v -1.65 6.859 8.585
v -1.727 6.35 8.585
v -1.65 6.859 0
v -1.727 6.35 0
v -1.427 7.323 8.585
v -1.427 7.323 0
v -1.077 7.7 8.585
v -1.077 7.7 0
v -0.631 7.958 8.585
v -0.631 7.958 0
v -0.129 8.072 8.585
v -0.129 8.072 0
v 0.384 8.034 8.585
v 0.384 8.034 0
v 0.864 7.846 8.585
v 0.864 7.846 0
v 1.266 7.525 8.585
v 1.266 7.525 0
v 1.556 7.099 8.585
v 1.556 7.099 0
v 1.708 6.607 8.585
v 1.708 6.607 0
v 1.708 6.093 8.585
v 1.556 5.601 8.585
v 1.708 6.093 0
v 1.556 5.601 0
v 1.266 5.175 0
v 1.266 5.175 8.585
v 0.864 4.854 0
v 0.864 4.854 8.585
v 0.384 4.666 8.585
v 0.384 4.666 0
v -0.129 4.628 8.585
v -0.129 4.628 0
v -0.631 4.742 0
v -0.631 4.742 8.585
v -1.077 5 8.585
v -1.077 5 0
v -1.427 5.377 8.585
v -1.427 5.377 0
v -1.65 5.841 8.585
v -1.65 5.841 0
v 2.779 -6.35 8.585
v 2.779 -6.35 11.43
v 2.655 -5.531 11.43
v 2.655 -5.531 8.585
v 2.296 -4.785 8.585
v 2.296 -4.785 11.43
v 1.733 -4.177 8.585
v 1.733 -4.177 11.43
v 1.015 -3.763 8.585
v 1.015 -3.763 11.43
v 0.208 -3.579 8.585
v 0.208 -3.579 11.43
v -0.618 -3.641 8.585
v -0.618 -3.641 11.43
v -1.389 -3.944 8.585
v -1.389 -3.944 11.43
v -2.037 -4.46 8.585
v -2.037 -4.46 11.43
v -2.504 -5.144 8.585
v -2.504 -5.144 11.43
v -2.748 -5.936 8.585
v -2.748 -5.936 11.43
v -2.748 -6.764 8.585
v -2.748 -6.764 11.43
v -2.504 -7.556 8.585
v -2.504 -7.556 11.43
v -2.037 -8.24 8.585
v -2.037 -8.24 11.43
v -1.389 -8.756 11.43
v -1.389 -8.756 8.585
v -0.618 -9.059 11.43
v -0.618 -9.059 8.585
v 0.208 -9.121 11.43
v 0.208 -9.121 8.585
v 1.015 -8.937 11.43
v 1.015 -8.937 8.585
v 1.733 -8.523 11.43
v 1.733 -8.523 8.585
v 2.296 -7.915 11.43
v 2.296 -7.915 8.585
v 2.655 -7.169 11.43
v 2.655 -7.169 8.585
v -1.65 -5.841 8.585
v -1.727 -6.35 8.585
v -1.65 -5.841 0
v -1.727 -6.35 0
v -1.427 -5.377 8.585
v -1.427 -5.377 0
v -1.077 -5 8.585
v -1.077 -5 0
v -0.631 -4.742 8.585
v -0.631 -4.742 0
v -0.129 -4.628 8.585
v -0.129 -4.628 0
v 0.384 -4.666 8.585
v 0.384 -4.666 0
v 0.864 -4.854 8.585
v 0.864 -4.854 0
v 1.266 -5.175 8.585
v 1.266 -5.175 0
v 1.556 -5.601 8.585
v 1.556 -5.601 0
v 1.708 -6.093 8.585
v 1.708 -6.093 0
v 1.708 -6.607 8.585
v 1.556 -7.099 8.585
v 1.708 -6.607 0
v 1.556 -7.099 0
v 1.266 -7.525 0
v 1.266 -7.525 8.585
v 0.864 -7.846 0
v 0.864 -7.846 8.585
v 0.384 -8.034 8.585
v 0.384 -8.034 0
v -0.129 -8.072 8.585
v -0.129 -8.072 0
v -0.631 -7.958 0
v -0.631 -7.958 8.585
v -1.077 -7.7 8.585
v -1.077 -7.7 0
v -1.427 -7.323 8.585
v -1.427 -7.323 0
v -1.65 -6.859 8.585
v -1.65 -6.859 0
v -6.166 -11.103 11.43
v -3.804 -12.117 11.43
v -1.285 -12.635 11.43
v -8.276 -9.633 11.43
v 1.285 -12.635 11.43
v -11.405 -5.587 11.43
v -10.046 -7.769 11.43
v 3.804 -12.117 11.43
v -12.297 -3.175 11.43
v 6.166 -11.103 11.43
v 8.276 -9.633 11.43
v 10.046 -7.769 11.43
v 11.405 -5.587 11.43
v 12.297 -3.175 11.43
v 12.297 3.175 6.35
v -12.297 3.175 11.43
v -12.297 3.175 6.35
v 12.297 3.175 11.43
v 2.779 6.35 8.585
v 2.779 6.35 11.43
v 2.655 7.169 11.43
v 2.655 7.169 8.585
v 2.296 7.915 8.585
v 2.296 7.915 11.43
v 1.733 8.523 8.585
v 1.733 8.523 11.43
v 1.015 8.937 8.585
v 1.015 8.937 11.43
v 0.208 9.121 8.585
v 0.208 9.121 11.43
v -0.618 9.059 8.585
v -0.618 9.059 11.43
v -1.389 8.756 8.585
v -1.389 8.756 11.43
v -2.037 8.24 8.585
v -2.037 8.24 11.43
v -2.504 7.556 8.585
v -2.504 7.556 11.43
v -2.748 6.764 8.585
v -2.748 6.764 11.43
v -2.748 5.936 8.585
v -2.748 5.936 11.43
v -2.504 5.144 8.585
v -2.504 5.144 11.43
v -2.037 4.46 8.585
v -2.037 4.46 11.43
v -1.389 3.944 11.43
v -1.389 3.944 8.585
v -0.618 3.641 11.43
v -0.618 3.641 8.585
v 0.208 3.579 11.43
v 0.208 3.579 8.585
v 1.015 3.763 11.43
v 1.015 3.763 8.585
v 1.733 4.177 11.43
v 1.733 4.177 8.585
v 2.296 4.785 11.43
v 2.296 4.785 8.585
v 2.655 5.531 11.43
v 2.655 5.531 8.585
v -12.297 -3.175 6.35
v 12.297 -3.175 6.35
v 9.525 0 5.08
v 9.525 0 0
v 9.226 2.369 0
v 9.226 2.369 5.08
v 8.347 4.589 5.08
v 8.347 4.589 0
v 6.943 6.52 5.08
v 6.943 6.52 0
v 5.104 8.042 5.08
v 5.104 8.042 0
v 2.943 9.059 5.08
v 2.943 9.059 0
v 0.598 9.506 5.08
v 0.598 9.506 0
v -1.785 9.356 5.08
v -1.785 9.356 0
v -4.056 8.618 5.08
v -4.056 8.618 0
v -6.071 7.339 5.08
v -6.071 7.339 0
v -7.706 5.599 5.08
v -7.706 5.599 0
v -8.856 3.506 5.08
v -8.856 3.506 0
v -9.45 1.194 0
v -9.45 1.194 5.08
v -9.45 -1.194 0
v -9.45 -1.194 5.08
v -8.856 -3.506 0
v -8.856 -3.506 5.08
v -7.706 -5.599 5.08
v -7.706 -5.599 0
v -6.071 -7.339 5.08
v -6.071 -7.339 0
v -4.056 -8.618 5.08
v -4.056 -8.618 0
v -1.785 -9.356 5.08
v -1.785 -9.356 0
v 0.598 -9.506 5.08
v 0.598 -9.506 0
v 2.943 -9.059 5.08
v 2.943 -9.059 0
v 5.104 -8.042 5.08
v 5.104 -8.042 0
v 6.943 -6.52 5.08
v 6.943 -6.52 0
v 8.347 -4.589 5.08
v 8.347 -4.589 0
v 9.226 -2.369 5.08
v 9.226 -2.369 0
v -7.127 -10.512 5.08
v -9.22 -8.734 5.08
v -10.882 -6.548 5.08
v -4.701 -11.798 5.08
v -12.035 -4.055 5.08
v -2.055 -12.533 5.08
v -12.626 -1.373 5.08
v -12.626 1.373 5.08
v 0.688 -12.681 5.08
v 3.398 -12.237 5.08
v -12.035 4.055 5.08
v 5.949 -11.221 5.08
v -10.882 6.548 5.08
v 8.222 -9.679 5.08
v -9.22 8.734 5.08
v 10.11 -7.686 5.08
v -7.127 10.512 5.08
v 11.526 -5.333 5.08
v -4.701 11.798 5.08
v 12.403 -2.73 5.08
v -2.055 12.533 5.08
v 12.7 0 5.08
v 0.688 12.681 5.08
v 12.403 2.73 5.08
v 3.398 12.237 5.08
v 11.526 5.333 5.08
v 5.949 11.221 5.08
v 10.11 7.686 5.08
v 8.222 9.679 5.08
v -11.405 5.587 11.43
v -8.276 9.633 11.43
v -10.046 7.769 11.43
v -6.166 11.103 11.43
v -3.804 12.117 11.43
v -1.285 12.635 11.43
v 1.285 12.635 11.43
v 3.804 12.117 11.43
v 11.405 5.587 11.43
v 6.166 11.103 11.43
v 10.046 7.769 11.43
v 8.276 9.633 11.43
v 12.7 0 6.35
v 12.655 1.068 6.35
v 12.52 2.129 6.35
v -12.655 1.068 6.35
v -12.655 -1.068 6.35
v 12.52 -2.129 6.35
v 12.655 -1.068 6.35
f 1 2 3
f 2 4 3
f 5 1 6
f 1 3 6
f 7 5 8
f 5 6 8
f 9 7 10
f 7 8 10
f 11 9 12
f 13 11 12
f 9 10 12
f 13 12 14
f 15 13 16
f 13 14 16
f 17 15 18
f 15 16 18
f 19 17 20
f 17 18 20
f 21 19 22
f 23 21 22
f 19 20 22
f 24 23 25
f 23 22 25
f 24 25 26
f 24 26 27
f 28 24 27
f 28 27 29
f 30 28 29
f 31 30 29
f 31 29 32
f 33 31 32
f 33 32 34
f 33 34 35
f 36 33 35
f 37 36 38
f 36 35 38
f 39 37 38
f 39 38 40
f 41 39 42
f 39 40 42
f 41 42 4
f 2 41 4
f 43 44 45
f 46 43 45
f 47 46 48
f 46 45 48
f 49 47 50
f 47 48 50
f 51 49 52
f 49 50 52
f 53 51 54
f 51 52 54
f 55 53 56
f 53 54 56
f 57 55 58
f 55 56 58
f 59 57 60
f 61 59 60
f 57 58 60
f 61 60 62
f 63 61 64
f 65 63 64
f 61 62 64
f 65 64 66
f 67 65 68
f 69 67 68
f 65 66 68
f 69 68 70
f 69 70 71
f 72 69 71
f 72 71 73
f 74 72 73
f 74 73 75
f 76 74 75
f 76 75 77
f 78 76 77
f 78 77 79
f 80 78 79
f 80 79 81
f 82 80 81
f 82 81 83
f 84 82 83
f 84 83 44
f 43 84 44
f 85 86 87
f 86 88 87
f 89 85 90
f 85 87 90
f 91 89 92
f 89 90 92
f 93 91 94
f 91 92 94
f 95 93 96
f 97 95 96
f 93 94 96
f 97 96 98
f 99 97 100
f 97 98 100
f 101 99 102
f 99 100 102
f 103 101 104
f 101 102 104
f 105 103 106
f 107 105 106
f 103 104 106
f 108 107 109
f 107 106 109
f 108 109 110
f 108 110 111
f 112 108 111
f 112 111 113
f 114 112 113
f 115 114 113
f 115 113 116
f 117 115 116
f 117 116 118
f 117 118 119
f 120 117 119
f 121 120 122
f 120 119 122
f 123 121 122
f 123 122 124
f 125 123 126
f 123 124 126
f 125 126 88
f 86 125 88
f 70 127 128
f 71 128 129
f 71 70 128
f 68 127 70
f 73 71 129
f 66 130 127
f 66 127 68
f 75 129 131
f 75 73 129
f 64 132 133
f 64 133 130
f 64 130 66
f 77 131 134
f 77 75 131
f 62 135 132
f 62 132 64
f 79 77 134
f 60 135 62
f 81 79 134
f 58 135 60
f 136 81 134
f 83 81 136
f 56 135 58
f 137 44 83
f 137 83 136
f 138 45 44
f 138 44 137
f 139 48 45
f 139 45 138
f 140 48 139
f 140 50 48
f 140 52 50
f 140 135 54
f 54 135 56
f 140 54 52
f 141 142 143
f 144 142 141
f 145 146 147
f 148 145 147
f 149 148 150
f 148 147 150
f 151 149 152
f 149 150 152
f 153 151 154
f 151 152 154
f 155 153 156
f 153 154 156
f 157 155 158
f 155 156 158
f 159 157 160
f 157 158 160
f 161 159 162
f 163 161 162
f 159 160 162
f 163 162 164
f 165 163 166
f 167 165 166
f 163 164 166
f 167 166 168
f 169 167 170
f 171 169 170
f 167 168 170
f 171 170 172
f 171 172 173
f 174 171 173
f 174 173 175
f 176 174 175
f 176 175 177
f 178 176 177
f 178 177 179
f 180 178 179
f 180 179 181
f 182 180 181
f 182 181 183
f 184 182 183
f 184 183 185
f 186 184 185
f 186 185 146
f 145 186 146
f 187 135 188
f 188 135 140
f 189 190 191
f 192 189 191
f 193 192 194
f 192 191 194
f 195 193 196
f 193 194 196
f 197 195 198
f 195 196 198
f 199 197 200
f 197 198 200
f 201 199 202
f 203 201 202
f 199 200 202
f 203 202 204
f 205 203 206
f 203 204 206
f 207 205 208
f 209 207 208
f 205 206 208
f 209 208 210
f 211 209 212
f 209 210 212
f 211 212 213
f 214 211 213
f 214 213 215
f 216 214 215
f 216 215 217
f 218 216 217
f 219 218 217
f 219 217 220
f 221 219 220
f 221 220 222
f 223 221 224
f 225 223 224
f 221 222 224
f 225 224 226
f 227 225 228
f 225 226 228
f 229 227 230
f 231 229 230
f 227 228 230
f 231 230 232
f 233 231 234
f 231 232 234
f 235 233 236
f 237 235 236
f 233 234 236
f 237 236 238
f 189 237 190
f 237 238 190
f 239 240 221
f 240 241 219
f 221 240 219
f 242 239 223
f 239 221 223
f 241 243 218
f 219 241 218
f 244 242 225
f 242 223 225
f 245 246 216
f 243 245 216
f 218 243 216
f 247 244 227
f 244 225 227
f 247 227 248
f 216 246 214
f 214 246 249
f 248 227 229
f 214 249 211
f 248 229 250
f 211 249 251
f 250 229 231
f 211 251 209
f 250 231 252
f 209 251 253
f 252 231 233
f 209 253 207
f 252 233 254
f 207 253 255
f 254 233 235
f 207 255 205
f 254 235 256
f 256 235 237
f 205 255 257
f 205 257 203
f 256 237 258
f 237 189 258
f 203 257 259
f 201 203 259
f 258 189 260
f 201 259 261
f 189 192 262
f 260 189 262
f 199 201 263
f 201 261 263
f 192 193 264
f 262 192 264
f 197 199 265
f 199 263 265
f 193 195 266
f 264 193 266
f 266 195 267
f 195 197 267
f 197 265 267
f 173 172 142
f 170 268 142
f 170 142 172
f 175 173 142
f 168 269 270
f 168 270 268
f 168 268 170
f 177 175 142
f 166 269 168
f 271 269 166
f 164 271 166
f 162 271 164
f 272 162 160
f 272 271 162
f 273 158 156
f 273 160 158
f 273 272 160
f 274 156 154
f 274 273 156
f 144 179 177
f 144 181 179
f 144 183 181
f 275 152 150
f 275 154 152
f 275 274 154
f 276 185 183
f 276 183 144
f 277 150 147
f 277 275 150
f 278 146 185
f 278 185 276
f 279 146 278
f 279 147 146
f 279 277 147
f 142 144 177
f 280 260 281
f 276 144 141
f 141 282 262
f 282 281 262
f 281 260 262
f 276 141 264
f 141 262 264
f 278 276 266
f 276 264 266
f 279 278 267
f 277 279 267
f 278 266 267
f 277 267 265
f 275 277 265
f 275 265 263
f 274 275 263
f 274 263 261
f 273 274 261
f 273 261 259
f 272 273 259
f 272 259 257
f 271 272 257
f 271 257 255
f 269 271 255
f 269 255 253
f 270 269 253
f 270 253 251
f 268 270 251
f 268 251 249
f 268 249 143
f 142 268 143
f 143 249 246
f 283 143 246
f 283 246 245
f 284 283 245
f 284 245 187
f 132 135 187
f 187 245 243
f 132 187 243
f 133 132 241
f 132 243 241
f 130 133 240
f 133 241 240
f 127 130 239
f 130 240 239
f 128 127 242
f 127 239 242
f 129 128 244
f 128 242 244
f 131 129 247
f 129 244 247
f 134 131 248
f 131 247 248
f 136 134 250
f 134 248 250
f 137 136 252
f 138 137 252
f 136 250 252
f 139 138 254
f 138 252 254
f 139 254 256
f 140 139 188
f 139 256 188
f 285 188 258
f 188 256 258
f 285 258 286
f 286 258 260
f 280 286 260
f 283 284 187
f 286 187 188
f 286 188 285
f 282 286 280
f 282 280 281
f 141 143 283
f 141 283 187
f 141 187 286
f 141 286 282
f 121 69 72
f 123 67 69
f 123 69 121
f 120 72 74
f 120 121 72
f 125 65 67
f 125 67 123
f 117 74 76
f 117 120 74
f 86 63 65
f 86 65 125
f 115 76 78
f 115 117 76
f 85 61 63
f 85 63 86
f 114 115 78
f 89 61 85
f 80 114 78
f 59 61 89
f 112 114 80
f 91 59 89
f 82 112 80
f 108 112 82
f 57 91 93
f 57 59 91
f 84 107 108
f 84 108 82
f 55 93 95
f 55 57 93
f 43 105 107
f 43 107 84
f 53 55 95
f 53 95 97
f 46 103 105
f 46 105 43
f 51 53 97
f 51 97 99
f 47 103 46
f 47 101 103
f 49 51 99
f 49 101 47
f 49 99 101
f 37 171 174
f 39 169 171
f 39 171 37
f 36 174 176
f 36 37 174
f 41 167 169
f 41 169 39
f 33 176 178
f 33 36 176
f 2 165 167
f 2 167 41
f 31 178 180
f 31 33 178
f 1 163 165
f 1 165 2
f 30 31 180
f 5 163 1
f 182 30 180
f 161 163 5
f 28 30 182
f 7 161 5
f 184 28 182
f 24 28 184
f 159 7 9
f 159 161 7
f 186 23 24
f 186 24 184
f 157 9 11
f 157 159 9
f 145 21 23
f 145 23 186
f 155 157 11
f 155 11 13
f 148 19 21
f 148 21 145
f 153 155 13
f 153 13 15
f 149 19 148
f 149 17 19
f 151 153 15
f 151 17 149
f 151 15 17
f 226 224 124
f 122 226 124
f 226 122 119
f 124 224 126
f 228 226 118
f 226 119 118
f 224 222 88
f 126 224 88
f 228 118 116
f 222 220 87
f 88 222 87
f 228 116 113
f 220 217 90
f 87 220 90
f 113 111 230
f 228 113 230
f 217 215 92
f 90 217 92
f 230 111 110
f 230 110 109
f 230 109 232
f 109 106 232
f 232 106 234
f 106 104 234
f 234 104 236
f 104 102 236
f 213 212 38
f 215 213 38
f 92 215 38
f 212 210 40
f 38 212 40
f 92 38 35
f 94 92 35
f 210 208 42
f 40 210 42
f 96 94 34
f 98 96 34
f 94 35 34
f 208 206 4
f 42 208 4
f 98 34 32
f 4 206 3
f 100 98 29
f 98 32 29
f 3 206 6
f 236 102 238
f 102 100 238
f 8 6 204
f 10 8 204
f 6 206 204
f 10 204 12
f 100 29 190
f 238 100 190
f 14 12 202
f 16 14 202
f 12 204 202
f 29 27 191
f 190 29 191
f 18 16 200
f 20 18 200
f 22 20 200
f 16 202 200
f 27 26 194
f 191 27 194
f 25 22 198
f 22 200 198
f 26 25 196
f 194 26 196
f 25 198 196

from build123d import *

# Parameters (mm, degrees)
SKETCH1_R                                      = 9.525
BOSS_EXTRUDE1_DEPTH                            = 5.08
SKETCH2_R                                      = 12.7
BOSS_EXTRUDE2_DEPTH                            = 6.35
SKETCH3_W                                      = 25.4
SKETCH3_H                                      = 6.35
CUT_EXTRUDE1_DEPTH                             = 5.08
CBORE_FOR_4_SOCKET_HEAD_CAP_SCREW1_D           = 3.4544
CBORE_FOR_4_SOCKET_HEAD_CAP_SCREW1_CBORE_D     = 5.55752
CBORE_FOR_4_SOCKET_HEAD_CAP_SCREW1_CBORE_DEPTH = 2.8448


with BuildPart() as part:
    # Sketch1 → Boss-Extrude1 (new body)
    with BuildSketch(Plane.XY):
        Circle(SKETCH1_R)
    extrude(amount=BOSS_EXTRUDE1_DEPTH)

    # Sketch2 → Boss-Extrude2 (add)
    with BuildSketch(Plane.XY.offset(5.08)):
        Circle(SKETCH2_R)
    extrude(amount=BOSS_EXTRUDE2_DEPTH)

    # Sketch3 → Cut-Extrude1 (cut)
    with BuildSketch(Plane.XY.offset(11.43)):
        Rectangle(SKETCH3_W, SKETCH3_H)
    extrude(amount=-CUT_EXTRUDE1_DEPTH, mode=Mode.SUBTRACT)

    # CBORE for #4 Socket Head Cap Screw1 (through all)
    with Locations(Plane.XY.offset(11.43)):
        with Locations((0, -6.35), (0, 6.35)):
            CounterBoreHole(CBORE_FOR_4_SOCKET_HEAD_CAP_SCREW1_D / 2, CBORE_FOR_4_SOCKET_HEAD_CAP_SCREW1_CBORE_D / 2, CBORE_FOR_4_SOCKET_HEAD_CAP_SCREW1_CBORE_DEPTH)


solid = part.part
